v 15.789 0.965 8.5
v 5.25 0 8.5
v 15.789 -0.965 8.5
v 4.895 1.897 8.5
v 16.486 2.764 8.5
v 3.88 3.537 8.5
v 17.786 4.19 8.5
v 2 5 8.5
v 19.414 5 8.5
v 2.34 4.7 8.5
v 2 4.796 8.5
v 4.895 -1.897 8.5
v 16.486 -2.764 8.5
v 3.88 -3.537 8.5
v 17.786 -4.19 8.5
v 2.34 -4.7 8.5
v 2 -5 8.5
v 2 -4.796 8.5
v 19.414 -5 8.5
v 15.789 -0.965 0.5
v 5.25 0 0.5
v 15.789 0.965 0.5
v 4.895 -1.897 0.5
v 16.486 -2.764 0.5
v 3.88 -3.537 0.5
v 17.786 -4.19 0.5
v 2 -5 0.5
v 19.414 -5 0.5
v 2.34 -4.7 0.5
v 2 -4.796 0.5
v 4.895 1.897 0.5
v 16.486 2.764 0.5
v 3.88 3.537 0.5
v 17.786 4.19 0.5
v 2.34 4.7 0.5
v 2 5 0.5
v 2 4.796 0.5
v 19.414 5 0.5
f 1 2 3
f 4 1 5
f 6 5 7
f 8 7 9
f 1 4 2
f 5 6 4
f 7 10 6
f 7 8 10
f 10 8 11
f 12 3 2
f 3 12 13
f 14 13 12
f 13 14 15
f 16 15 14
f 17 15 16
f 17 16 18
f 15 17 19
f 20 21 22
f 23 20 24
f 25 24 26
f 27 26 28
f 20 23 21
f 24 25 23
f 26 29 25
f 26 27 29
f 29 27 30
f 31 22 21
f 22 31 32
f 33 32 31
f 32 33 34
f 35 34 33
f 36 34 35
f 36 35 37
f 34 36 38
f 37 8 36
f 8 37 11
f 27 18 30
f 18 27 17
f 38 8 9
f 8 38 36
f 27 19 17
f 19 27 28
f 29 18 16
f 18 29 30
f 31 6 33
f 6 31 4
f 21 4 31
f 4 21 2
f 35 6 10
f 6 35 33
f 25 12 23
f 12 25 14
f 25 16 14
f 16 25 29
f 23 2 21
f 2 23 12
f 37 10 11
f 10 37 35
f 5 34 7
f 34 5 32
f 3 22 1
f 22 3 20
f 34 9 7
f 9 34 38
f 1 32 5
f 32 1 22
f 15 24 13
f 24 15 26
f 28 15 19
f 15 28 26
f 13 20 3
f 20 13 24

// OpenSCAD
//15.74mm dia

//10.42mm gap

difference() {
    translate([2,-5,0.5]) cube([17.55,10,8]);
    cylinder(10, 10.5/2, 10.5/2);
    translate([5.21+(15.74),0,0]) cylinder(10, 10.5/2, 10.5/2);
}
